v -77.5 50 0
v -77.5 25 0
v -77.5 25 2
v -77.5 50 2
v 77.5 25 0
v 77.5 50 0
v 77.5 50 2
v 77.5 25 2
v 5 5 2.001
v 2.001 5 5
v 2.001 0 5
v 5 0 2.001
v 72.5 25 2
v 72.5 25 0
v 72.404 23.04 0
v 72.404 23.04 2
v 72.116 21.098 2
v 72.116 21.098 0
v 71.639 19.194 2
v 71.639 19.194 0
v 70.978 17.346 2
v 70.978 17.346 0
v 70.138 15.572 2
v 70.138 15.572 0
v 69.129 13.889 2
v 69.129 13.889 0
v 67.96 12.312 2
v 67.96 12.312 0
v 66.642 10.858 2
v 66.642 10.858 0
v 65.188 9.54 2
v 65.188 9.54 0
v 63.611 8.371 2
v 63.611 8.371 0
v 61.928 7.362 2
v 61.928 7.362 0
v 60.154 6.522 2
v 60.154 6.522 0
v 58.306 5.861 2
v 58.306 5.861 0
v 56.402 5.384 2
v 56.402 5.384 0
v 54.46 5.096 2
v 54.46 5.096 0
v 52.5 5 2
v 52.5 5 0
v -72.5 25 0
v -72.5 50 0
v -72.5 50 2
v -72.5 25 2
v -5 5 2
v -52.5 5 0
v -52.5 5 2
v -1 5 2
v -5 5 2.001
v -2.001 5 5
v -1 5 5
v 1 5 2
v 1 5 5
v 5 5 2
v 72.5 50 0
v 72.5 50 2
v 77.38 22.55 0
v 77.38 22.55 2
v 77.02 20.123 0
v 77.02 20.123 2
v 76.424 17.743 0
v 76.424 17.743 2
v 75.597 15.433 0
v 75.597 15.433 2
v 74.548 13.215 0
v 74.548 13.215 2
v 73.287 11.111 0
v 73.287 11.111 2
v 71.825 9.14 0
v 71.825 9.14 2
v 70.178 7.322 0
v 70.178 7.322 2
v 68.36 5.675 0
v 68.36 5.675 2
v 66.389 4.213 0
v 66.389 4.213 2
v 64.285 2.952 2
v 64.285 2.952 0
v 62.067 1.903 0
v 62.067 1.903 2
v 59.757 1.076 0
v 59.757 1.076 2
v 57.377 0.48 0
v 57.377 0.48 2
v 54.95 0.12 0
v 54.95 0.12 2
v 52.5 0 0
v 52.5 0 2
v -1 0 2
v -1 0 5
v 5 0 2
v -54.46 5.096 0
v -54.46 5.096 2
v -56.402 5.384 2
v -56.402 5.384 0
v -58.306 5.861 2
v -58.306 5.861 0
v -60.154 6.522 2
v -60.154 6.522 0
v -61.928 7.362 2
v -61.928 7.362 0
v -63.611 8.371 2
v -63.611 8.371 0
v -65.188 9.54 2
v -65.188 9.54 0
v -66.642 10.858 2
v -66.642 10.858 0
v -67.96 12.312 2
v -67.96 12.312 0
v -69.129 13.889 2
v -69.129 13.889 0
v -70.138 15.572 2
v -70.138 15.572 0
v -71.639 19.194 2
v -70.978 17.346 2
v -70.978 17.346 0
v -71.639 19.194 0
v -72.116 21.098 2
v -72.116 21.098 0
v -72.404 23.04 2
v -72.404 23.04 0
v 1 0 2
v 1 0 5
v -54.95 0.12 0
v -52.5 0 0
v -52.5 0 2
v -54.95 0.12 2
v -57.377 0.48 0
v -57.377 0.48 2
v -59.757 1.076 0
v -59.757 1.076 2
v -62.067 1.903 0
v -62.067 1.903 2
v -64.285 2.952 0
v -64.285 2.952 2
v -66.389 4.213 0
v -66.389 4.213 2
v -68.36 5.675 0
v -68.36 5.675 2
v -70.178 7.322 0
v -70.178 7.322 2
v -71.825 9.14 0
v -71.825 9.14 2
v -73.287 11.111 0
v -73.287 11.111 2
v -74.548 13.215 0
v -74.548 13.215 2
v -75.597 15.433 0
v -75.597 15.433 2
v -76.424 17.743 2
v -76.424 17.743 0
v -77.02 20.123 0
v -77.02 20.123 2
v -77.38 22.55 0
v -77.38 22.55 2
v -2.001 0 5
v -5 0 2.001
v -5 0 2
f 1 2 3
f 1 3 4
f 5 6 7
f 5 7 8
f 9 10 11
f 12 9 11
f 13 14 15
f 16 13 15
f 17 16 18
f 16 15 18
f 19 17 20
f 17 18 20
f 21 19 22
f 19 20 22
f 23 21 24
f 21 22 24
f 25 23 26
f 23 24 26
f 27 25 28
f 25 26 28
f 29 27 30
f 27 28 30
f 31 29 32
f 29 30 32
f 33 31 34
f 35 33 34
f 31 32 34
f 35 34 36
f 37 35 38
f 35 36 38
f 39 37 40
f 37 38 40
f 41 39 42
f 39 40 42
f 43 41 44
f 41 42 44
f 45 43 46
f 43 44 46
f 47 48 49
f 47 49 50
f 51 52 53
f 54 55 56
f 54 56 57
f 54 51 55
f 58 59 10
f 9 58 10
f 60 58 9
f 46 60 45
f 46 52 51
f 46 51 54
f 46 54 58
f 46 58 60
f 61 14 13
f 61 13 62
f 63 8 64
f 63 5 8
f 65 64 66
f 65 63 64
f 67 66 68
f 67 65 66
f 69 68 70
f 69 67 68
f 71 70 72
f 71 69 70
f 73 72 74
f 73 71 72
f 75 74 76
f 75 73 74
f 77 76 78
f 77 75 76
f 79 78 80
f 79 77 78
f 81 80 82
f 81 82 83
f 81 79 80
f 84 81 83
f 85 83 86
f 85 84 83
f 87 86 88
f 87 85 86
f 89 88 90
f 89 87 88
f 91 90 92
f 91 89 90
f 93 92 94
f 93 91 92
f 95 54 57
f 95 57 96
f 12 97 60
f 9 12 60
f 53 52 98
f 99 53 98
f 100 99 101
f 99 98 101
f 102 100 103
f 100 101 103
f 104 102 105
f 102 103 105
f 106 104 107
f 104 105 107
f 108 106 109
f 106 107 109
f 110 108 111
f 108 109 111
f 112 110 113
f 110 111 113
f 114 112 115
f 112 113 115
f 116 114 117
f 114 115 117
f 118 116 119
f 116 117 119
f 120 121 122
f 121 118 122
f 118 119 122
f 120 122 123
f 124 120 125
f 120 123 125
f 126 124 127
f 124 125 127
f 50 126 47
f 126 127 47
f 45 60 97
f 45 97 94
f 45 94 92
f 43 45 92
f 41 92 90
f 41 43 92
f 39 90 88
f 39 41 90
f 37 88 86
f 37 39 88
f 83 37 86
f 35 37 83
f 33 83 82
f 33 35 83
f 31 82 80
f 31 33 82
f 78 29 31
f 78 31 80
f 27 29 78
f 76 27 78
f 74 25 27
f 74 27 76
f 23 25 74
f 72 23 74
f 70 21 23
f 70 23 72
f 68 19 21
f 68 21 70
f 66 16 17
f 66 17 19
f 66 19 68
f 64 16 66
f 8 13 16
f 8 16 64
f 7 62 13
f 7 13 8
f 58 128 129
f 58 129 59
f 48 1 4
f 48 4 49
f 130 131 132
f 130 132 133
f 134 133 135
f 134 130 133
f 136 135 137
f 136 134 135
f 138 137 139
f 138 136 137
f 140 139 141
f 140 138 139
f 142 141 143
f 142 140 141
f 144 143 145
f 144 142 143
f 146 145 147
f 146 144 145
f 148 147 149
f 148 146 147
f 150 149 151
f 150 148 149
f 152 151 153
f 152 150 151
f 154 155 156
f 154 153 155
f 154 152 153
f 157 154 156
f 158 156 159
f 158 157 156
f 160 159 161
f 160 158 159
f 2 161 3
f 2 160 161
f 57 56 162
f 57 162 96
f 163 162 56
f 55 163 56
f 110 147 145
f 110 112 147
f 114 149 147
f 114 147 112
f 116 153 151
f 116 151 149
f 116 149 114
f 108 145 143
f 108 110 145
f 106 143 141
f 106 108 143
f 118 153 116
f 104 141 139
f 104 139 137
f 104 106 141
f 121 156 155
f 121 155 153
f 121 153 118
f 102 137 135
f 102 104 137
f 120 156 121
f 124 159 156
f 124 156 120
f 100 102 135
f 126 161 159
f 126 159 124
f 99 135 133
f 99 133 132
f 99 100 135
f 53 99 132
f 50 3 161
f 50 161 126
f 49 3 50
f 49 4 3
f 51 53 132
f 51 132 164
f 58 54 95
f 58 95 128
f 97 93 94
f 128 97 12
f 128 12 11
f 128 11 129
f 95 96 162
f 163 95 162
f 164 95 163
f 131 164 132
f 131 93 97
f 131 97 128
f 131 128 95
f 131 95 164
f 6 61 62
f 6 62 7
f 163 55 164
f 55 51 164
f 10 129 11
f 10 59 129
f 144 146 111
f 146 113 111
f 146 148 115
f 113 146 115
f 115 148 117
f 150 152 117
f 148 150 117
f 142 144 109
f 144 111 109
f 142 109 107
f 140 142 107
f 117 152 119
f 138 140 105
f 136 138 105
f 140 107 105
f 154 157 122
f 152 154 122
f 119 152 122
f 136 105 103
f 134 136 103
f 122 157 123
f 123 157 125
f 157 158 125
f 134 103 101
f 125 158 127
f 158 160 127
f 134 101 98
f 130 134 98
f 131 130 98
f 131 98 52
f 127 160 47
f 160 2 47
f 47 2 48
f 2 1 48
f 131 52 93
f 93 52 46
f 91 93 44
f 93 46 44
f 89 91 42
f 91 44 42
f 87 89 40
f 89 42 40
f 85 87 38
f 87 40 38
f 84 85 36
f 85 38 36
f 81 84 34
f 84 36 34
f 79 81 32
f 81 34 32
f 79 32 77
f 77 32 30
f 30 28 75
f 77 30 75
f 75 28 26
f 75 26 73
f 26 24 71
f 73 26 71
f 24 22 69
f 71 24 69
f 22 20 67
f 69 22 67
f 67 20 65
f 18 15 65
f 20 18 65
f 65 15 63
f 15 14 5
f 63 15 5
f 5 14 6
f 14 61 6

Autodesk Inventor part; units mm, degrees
ref_plane "YZ Plane" through (0, 0, 0) normal (1, 0, 0) x (0, 1, 0)
ref_plane "XZ Plane" through (0, 0, 0) normal (0, 1, 0) x (-1, 0, 0)
ref_plane "XY Plane" through (0, 0, 0) normal (0, 0, 1) x (1, 0, 0)
sketch "Skizze1" plane through (0, 0, 0) normal (0, 0, 1) x (1, 0, 0)
  line L0 (0, 0) -> (-52.5, 0)
  arc A0 (-77.5, 25) -> (-52.5, 0) centre (-52.5, 25) ccw
  line L1 (-77.5, 25) -> (-77.5, 50)
  line L2 (-77.5, 50) -> (-72.5, 50)
  line L3 (-72.5, 50) -> (-72.5, 25)
  arc A1 (-72.5, 25) -> (-52.5, 5) centre (-52.5, 25) ccw
  line L4 (-52.5, 5) -> (0, 5)
  line L5 (0, 5) -> (0, 0)
  line L6 (-1, 5) -> (-1, 0)
  line L7 (-5, 5) -> (-5, 0)
  point P0 (-75, 50)
  dimension "d0" = 5
  dimension "d2" = 50
  dimension "d3" = 25
  dimension "d4" = 150
  dimension "d6" = 10
  dimension "d7" = 2
  dimension "d15" = 5
  dimension "d16" = 3
  dimension "d17" = 60
  dimension "d19" = 25
extrude "Extrusion1" add sketch "Skizze1" along normal blind 2
extrude "Extrusion2" add sketch "Skizze1" along normal blind 5 contours L0 L7 L4 L6
mirror "Spiegeln1" about plane through (0, 0, 0) normal (1, 0, 0) of "Extrusion1", "Extrusion2"
chamfer "Fase1" distance 3 angle 45 2 edges at (-5, 2.5, 5) (5, 2.5, 5)
properties part number "LEDholderh_3D-Druck"
